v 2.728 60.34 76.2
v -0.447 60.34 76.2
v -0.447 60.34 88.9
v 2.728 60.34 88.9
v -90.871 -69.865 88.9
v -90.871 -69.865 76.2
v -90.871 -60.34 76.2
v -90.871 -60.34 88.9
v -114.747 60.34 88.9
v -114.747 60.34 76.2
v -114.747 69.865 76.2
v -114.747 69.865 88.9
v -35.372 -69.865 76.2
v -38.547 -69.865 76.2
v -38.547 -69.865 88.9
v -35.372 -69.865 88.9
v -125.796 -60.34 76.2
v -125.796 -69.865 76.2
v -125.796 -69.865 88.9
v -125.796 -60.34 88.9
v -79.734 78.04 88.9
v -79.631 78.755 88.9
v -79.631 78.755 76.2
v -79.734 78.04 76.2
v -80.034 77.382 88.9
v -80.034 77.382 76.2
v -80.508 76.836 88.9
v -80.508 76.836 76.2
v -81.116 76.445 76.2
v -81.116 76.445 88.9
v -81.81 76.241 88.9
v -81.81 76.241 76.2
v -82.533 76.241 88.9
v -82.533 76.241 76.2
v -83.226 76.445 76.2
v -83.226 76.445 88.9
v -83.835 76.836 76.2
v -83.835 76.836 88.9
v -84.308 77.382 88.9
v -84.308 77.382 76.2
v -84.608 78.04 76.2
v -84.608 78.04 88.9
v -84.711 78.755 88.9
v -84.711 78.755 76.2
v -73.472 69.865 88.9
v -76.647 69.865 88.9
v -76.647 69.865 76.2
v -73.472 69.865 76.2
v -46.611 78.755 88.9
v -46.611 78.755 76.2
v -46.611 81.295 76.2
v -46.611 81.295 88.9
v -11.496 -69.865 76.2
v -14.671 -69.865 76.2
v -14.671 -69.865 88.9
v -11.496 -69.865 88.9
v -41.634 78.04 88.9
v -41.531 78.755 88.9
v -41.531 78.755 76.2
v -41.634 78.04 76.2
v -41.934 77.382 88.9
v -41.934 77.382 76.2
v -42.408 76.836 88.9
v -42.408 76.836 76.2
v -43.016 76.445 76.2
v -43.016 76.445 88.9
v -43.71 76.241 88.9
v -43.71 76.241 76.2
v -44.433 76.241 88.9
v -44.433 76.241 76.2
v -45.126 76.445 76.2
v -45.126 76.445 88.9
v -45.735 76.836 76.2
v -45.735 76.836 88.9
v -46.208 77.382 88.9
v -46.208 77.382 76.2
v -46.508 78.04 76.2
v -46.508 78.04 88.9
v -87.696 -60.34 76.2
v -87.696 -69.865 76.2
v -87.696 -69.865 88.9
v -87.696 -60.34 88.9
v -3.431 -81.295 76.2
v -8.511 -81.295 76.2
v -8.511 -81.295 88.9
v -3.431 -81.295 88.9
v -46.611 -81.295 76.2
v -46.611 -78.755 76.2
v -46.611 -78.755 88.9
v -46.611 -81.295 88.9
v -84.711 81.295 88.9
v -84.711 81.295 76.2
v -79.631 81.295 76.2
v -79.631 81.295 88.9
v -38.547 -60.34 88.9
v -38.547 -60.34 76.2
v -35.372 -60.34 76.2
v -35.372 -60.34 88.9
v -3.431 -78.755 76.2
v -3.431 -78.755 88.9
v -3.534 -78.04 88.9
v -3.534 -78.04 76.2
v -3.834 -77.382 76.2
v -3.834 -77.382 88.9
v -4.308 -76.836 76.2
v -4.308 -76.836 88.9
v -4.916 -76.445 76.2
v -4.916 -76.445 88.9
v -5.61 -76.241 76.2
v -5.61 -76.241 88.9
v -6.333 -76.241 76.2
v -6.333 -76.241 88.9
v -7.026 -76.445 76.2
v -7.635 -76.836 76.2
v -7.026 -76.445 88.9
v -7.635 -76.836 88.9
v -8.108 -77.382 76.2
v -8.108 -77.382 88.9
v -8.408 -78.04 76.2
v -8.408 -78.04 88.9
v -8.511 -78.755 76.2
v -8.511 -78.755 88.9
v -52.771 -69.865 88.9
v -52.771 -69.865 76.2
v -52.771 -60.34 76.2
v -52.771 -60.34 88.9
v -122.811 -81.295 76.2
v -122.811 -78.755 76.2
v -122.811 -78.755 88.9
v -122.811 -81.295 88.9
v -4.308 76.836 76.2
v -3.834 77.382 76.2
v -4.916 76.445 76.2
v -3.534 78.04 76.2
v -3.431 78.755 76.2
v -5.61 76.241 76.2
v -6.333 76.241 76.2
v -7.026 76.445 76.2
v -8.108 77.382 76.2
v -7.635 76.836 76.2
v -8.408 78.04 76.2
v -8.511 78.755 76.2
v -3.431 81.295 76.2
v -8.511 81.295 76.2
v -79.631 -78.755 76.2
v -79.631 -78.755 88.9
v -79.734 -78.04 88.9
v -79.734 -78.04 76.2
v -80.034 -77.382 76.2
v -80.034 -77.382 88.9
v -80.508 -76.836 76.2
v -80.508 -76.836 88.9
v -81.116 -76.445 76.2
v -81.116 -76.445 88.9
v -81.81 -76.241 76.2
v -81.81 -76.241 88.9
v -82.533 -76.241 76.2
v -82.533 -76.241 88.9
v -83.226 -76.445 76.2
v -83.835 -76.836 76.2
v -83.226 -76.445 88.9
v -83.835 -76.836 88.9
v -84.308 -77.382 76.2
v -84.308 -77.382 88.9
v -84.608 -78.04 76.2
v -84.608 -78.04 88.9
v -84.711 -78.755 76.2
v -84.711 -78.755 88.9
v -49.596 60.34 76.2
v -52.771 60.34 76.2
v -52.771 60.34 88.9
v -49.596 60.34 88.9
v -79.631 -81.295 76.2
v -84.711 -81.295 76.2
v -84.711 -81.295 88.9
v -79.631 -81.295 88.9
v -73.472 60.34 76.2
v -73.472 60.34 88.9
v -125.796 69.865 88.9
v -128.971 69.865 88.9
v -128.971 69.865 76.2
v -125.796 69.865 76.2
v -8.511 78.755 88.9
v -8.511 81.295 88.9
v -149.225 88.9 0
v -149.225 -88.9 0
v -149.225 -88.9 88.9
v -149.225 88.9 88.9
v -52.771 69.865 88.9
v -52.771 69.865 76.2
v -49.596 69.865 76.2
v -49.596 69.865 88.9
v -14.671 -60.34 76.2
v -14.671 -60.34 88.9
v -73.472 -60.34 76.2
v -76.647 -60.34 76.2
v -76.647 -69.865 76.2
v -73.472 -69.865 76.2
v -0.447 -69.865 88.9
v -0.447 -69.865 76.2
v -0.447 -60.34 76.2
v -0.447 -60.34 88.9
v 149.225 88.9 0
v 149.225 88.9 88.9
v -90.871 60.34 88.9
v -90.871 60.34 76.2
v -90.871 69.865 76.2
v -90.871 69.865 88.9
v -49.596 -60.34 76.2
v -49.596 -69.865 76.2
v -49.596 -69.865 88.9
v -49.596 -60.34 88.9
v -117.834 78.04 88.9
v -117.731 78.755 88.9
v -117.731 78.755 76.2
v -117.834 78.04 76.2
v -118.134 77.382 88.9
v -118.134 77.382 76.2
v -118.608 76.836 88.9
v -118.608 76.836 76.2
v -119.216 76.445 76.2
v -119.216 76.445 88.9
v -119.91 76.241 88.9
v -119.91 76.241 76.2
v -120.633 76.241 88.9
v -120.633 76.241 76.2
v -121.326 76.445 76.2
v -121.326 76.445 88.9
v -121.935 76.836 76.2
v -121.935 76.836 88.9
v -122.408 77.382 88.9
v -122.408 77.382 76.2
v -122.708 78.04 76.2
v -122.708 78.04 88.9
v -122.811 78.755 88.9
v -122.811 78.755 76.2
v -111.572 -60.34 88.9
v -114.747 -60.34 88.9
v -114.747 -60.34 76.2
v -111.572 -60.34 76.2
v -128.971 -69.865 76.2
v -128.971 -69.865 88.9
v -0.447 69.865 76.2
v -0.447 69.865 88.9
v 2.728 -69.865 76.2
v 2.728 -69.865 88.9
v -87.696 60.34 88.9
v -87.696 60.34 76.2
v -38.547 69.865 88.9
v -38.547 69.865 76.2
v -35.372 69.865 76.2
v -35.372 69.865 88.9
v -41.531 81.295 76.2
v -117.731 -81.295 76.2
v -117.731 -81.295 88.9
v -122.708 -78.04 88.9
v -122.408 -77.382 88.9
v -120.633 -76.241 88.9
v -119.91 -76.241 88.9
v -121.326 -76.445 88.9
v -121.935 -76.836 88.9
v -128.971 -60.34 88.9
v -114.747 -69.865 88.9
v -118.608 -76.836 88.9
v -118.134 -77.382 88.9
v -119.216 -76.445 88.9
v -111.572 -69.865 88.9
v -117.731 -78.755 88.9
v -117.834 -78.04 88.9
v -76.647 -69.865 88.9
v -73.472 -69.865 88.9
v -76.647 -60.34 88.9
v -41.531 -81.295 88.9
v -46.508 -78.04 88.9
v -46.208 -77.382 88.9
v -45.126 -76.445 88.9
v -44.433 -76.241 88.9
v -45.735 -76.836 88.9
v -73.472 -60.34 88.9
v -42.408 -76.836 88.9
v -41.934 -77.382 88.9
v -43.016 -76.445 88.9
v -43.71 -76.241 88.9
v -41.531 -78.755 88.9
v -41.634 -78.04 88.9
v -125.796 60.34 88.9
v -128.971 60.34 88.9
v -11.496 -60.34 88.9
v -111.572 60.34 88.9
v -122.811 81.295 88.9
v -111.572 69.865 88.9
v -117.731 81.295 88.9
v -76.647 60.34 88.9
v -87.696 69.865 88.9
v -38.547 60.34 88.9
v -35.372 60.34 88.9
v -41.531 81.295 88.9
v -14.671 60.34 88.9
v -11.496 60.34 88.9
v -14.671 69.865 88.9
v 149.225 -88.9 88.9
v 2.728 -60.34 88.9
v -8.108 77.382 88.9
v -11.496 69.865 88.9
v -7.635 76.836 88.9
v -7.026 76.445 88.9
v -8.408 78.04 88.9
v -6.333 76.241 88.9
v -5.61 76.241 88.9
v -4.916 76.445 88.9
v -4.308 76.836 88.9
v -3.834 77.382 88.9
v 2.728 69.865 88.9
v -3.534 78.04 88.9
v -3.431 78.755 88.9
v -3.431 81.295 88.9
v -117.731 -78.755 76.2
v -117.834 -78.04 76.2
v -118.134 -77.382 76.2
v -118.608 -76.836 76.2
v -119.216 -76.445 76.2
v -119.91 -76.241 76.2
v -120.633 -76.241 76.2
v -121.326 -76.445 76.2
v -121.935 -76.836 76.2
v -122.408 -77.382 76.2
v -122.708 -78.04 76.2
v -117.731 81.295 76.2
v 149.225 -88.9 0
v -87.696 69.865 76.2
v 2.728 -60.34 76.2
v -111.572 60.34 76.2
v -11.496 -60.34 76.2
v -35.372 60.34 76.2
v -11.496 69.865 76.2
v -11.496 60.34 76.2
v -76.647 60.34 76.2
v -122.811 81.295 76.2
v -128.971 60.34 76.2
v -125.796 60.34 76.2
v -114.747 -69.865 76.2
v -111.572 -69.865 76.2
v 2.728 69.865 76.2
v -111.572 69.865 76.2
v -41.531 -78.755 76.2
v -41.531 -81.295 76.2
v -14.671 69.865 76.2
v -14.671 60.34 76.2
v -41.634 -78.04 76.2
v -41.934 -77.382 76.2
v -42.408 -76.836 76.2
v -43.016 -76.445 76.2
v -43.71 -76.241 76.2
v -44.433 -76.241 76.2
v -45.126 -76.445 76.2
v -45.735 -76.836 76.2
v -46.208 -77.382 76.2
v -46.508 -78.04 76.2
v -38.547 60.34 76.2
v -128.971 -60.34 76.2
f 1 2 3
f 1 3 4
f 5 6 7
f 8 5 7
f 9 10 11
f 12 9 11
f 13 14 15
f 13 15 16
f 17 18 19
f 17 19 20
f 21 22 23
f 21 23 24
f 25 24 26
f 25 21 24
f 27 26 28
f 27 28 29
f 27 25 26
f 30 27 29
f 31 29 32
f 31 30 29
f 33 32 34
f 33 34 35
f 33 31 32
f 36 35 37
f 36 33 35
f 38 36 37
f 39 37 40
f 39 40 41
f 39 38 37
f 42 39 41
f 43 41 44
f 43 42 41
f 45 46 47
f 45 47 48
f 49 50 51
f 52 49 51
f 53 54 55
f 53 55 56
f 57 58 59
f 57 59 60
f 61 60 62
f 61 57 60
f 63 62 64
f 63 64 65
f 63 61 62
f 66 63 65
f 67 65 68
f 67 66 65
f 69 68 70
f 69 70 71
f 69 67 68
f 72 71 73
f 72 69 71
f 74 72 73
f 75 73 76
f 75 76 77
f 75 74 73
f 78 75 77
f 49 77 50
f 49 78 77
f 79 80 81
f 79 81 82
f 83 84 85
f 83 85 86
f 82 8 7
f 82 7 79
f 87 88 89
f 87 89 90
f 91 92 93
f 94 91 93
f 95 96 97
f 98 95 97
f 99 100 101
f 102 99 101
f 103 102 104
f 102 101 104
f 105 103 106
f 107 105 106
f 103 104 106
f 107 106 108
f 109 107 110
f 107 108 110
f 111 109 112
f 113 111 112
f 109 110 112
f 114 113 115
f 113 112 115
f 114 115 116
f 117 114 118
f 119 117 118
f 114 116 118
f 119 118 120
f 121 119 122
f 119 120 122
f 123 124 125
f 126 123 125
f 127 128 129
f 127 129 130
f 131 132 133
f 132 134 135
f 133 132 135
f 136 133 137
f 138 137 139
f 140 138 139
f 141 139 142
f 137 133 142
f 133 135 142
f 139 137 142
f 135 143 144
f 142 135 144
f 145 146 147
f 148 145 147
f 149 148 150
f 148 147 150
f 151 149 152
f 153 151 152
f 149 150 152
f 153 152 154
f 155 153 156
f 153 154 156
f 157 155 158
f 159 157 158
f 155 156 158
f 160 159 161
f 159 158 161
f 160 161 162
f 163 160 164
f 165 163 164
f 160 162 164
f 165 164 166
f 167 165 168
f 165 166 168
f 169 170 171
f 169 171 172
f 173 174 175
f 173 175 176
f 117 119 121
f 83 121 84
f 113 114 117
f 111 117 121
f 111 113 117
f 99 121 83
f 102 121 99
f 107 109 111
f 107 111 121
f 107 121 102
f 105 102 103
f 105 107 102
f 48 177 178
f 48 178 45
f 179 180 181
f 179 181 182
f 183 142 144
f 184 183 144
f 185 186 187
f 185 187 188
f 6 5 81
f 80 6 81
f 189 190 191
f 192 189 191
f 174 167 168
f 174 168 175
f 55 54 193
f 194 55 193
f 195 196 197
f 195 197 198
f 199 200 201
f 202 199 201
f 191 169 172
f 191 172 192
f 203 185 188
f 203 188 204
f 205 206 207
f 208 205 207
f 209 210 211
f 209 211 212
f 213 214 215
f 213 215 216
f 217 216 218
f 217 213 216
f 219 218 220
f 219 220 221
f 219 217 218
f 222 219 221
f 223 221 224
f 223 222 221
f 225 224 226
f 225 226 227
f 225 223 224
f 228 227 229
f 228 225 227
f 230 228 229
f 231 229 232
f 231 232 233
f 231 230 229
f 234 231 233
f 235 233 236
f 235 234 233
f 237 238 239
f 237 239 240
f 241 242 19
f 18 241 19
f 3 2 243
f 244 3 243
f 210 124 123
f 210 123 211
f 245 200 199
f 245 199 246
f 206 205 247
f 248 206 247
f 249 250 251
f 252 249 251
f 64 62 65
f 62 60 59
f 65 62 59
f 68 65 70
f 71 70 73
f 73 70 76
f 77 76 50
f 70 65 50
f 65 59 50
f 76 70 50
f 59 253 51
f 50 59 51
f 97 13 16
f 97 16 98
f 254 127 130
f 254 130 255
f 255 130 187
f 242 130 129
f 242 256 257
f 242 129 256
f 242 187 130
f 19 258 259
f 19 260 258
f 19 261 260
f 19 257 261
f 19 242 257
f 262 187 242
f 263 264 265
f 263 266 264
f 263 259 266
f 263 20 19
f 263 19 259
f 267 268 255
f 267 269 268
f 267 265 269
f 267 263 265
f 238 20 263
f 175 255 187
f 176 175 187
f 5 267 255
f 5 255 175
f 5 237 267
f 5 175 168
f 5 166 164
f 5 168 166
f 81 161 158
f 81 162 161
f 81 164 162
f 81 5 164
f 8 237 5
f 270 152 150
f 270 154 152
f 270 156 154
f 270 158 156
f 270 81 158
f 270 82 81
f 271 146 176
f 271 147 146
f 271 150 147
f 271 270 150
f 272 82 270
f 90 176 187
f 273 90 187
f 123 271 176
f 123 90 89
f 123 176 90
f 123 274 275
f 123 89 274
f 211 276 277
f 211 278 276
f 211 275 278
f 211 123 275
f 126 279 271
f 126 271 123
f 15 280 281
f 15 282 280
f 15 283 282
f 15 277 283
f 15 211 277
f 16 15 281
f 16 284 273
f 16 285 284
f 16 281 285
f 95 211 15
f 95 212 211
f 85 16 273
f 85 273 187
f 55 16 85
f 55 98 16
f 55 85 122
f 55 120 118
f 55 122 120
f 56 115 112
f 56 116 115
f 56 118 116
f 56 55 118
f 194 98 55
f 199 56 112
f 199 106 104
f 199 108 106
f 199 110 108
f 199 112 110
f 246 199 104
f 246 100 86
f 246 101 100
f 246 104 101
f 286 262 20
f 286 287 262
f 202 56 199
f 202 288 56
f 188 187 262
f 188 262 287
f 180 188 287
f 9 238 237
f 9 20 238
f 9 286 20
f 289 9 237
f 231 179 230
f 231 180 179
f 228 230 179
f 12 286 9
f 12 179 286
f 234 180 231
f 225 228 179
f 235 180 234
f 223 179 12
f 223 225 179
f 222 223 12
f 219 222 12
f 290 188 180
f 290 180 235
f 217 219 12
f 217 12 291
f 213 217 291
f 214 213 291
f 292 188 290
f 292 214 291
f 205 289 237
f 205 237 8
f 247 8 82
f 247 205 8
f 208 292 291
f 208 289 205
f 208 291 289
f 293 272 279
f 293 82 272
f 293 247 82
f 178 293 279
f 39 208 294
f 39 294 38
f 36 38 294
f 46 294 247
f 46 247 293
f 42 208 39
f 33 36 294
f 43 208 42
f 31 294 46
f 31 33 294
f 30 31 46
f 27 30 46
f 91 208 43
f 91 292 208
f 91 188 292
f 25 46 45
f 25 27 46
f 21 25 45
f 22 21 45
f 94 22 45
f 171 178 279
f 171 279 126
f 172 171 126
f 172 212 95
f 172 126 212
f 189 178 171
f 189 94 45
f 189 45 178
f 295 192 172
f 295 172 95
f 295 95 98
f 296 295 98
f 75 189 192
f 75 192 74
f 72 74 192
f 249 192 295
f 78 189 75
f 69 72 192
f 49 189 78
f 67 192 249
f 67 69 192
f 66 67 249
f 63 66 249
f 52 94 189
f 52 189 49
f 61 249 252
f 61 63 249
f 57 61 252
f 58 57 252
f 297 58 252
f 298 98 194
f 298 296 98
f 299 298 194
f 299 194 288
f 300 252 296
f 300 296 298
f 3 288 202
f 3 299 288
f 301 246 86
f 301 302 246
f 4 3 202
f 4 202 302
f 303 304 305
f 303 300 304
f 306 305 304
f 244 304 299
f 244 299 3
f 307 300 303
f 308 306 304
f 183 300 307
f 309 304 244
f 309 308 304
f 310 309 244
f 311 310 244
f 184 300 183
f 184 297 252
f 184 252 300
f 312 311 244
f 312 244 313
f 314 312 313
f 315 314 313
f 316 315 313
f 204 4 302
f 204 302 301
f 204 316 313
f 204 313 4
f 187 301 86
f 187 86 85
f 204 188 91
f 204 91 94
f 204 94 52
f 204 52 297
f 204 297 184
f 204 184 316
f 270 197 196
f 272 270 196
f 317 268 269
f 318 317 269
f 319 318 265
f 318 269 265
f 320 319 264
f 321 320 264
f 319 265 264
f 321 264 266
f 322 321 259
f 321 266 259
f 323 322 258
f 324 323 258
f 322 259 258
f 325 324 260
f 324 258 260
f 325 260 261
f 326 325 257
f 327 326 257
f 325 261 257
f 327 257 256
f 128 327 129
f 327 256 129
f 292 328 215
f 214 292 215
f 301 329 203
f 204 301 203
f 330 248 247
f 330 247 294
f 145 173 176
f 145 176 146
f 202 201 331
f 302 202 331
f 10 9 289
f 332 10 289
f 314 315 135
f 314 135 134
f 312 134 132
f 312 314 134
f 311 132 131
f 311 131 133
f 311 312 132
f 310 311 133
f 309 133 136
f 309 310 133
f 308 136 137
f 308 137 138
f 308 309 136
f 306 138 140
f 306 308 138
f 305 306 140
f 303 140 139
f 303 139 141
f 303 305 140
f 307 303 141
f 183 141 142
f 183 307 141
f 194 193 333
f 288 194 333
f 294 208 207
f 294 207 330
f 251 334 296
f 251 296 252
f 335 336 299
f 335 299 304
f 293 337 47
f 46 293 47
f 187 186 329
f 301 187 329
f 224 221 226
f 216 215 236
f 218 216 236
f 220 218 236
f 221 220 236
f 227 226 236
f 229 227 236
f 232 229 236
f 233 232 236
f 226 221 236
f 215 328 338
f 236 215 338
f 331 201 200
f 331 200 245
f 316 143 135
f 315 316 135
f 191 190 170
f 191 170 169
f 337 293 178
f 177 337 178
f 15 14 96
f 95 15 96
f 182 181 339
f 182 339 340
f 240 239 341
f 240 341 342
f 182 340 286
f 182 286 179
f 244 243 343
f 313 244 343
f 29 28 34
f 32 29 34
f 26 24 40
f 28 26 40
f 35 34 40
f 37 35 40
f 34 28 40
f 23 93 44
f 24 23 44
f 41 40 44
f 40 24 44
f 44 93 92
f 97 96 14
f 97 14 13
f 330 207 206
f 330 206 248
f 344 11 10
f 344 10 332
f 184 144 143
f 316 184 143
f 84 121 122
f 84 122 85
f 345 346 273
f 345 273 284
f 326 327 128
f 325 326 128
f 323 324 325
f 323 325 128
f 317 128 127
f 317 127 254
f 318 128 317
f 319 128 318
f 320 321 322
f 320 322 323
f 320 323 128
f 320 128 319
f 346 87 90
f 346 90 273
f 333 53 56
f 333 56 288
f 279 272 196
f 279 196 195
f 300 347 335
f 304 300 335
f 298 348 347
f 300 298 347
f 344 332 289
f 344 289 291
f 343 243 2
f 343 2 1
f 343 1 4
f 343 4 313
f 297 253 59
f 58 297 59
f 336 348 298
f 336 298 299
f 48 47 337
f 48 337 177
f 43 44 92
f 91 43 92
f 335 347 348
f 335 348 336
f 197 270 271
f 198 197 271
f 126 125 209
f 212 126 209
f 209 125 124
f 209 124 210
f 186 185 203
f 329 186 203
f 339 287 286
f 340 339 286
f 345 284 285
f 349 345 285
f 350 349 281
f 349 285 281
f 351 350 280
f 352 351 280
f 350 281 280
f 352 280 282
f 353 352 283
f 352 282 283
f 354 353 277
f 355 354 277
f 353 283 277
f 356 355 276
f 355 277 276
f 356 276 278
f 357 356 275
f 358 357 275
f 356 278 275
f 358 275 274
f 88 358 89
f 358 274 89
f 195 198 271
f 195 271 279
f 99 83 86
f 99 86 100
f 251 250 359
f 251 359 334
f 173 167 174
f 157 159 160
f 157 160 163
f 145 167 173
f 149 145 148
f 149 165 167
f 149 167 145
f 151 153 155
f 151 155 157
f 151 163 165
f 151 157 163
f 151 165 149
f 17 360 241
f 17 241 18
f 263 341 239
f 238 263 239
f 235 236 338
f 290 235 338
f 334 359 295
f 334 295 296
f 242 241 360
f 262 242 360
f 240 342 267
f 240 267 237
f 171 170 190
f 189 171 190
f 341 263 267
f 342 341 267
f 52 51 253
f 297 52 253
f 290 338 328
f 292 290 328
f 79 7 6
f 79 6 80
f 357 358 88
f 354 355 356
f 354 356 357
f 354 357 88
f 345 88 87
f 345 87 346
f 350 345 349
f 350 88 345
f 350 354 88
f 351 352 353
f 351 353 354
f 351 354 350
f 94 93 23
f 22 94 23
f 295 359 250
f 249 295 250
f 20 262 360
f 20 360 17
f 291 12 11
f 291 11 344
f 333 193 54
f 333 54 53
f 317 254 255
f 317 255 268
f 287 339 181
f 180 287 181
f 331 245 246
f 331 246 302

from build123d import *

# Parameters (mm, degrees)
SKETCH1_W           = 298.45
SKETCH1_H           = 177.8
BOSS_EXTRUDE1_DEPTH = 88.9
SKETCH2_W           = 3.175
SKETCH2_H           = 9.525
CUT_EXTRUDE1_DEPTH  = 12.7


with BuildPart() as part:
    # Sketch1 → Boss-Extrude1 (new body)
    with BuildSketch(Plane.XY):
        Rectangle(SKETCH1_W, SKETCH1_H)
    extrude(amount=BOSS_EXTRUDE1_DEPTH)

    # Sketch2 → Cut-Extrude1 (cut)
    with BuildSketch(Plane.XY.offset(88.9)):
        with Locations((-113.159227622, 65.102829303)):
            Rectangle(SKETCH2_W, SKETCH2_H)
        with Locations((-127.383227622, 65.102829303)):
            Rectangle(SKETCH2_W, SKETCH2_H)
        with Locations((-75.059227622, 65.102829303)):
            Rectangle(SKETCH2_W, SKETCH2_H)
        with Locations((-89.283227622, 65.102829303)):
            Rectangle(SKETCH2_W, SKETCH2_H)
        with BuildLine():
            Line((-122.811227622, 81.295329303), (-117.731227622, 81.295329303))
            Line((-117.731227622, 81.295329303), (-117.731227622, 78.755329303))
            ThreePointArc((-117.731227622, 78.755329303), (-120.271227622, 76.215329303), (-122.811227622, 78.755329303))
            Line((-122.811227622, 78.755329303), (-122.811227622, 81.295329303))
        make_face()
        with BuildLine():
            Line((-84.711227622, 81.295329303), (-79.631227622, 81.295329303))
            Line((-79.631227622, 81.295329303), (-79.631227622, 78.755329303))
            ThreePointArc((-79.631227622, 78.755329303), (-82.171227622, 76.215329303), (-84.711227622, 78.755329303))
            Line((-84.711227622, 78.755329303), (-84.711227622, 81.295329303))
        make_face()
        with Locations((-36.959227622, 65.102829303)):
            Rectangle(SKETCH2_W, SKETCH2_H)
        with Locations((-51.183227622, 65.102829303)):
            Rectangle(SKETCH2_W, SKETCH2_H)
        with BuildLine():
            Line((-46.611227622, 81.295329303), (-41.531227622, 81.295329303))
            Line((-41.531227622, 81.295329303), (-41.531227622, 78.755329303))
            ThreePointArc((-41.531227622, 78.755329303), (-44.071227622, 76.215329303), (-46.611227622, 78.755329303))
            Line((-46.611227622, 78.755329303), (-46.611227622, 81.295329303))
        make_face()
        with Locations((1.140772378, 65.102829303)):
            Rectangle(SKETCH2_W, SKETCH2_H)
        with Locations((-13.083227622, 65.102829303)):
            Rectangle(SKETCH2_W, SKETCH2_H)
        with BuildLine():
            Line((-8.511227622, 81.295329303), (-3.431227622, 81.295329303))
            Line((-3.431227622, 81.295329303), (-3.431227622, 78.755329303))
            ThreePointArc((-3.431227622, 78.755329303), (-5.971227622, 76.215329303), (-8.511227622, 78.755329303))
            Line((-8.511227622, 78.755329303), (-8.511227622, 81.295329303))
        make_face()
        with BuildLine():
            Line((-3.431227622, -81.295329303), (-3.431227622, -78.755329303))
            ThreePointArc((-3.431227622, -78.755329303), (-5.971227622, -76.215329303), (-8.511227622, -78.755329303))
            Line((-8.511227622, -78.755329303), (-8.511227622, -81.295329303))
            Line((-8.511227622, -81.295329303), (-3.431227622, -81.295329303))
        make_face()
        with Locations((1.140772378, -65.102829303)):
            Rectangle(SKETCH2_W, SKETCH2_H)
        with Locations((-13.083227622, -65.102829303)):
            Rectangle(SKETCH2_W, SKETCH2_H)
        with BuildLine():
            Line((-41.531227622, -81.295329303), (-41.531227622, -78.755329303))
            ThreePointArc((-41.531227622, -78.755329303), (-44.071227622, -76.215329303), (-46.611227622, -78.755329303))
            Line((-46.611227622, -78.755329303), (-46.611227622, -81.295329303))
            Line((-46.611227622, -81.295329303), (-41.531227622, -81.295329303))
        make_face()
        with Locations((-36.959227622, -65.102829303)):
            Rectangle(SKETCH2_W, SKETCH2_H)
        with Locations((-51.183227622, -65.102829303)):
            Rectangle(SKETCH2_W, SKETCH2_H)
        with BuildLine():
            Line((-79.631227622, -81.295329303), (-79.631227622, -78.755329303))
            ThreePointArc((-79.631227622, -78.755329303), (-82.171227622, -76.215329303), (-84.711227622, -78.755329303))
            Line((-84.711227622, -78.755329303), (-84.711227622, -81.295329303))
            Line((-84.711227622, -81.295329303), (-79.631227622, -81.295329303))
        make_face()
        with Locations((-75.059227622, -65.102829303)):
            Rectangle(SKETCH2_W, SKETCH2_H)
        with Locations((-89.283227622, -65.102829303)):
            Rectangle(SKETCH2_W, SKETCH2_H)
        with BuildLine():
            Line((-117.731227622, -81.295329303), (-117.731227622, -78.755329303))
            ThreePointArc((-117.731227622, -78.755329303), (-120.271227622, -76.215329303), (-122.811227622, -78.755329303))
            Line((-122.811227622, -78.755329303), (-122.811227622, -81.295329303))
            Line((-122.811227622, -81.295329303), (-117.731227622, -81.295329303))
        make_face()
        with Locations((-113.159227622, -65.102829303)):
            Rectangle(SKETCH2_W, SKETCH2_H)
        with Locations((-127.383227622, -65.102829303)):
            Rectangle(SKETCH2_W, SKETCH2_H)
    extrude(amount=-CUT_EXTRUDE1_DEPTH, mode=Mode.SUBTRACT)


solid = part.part
